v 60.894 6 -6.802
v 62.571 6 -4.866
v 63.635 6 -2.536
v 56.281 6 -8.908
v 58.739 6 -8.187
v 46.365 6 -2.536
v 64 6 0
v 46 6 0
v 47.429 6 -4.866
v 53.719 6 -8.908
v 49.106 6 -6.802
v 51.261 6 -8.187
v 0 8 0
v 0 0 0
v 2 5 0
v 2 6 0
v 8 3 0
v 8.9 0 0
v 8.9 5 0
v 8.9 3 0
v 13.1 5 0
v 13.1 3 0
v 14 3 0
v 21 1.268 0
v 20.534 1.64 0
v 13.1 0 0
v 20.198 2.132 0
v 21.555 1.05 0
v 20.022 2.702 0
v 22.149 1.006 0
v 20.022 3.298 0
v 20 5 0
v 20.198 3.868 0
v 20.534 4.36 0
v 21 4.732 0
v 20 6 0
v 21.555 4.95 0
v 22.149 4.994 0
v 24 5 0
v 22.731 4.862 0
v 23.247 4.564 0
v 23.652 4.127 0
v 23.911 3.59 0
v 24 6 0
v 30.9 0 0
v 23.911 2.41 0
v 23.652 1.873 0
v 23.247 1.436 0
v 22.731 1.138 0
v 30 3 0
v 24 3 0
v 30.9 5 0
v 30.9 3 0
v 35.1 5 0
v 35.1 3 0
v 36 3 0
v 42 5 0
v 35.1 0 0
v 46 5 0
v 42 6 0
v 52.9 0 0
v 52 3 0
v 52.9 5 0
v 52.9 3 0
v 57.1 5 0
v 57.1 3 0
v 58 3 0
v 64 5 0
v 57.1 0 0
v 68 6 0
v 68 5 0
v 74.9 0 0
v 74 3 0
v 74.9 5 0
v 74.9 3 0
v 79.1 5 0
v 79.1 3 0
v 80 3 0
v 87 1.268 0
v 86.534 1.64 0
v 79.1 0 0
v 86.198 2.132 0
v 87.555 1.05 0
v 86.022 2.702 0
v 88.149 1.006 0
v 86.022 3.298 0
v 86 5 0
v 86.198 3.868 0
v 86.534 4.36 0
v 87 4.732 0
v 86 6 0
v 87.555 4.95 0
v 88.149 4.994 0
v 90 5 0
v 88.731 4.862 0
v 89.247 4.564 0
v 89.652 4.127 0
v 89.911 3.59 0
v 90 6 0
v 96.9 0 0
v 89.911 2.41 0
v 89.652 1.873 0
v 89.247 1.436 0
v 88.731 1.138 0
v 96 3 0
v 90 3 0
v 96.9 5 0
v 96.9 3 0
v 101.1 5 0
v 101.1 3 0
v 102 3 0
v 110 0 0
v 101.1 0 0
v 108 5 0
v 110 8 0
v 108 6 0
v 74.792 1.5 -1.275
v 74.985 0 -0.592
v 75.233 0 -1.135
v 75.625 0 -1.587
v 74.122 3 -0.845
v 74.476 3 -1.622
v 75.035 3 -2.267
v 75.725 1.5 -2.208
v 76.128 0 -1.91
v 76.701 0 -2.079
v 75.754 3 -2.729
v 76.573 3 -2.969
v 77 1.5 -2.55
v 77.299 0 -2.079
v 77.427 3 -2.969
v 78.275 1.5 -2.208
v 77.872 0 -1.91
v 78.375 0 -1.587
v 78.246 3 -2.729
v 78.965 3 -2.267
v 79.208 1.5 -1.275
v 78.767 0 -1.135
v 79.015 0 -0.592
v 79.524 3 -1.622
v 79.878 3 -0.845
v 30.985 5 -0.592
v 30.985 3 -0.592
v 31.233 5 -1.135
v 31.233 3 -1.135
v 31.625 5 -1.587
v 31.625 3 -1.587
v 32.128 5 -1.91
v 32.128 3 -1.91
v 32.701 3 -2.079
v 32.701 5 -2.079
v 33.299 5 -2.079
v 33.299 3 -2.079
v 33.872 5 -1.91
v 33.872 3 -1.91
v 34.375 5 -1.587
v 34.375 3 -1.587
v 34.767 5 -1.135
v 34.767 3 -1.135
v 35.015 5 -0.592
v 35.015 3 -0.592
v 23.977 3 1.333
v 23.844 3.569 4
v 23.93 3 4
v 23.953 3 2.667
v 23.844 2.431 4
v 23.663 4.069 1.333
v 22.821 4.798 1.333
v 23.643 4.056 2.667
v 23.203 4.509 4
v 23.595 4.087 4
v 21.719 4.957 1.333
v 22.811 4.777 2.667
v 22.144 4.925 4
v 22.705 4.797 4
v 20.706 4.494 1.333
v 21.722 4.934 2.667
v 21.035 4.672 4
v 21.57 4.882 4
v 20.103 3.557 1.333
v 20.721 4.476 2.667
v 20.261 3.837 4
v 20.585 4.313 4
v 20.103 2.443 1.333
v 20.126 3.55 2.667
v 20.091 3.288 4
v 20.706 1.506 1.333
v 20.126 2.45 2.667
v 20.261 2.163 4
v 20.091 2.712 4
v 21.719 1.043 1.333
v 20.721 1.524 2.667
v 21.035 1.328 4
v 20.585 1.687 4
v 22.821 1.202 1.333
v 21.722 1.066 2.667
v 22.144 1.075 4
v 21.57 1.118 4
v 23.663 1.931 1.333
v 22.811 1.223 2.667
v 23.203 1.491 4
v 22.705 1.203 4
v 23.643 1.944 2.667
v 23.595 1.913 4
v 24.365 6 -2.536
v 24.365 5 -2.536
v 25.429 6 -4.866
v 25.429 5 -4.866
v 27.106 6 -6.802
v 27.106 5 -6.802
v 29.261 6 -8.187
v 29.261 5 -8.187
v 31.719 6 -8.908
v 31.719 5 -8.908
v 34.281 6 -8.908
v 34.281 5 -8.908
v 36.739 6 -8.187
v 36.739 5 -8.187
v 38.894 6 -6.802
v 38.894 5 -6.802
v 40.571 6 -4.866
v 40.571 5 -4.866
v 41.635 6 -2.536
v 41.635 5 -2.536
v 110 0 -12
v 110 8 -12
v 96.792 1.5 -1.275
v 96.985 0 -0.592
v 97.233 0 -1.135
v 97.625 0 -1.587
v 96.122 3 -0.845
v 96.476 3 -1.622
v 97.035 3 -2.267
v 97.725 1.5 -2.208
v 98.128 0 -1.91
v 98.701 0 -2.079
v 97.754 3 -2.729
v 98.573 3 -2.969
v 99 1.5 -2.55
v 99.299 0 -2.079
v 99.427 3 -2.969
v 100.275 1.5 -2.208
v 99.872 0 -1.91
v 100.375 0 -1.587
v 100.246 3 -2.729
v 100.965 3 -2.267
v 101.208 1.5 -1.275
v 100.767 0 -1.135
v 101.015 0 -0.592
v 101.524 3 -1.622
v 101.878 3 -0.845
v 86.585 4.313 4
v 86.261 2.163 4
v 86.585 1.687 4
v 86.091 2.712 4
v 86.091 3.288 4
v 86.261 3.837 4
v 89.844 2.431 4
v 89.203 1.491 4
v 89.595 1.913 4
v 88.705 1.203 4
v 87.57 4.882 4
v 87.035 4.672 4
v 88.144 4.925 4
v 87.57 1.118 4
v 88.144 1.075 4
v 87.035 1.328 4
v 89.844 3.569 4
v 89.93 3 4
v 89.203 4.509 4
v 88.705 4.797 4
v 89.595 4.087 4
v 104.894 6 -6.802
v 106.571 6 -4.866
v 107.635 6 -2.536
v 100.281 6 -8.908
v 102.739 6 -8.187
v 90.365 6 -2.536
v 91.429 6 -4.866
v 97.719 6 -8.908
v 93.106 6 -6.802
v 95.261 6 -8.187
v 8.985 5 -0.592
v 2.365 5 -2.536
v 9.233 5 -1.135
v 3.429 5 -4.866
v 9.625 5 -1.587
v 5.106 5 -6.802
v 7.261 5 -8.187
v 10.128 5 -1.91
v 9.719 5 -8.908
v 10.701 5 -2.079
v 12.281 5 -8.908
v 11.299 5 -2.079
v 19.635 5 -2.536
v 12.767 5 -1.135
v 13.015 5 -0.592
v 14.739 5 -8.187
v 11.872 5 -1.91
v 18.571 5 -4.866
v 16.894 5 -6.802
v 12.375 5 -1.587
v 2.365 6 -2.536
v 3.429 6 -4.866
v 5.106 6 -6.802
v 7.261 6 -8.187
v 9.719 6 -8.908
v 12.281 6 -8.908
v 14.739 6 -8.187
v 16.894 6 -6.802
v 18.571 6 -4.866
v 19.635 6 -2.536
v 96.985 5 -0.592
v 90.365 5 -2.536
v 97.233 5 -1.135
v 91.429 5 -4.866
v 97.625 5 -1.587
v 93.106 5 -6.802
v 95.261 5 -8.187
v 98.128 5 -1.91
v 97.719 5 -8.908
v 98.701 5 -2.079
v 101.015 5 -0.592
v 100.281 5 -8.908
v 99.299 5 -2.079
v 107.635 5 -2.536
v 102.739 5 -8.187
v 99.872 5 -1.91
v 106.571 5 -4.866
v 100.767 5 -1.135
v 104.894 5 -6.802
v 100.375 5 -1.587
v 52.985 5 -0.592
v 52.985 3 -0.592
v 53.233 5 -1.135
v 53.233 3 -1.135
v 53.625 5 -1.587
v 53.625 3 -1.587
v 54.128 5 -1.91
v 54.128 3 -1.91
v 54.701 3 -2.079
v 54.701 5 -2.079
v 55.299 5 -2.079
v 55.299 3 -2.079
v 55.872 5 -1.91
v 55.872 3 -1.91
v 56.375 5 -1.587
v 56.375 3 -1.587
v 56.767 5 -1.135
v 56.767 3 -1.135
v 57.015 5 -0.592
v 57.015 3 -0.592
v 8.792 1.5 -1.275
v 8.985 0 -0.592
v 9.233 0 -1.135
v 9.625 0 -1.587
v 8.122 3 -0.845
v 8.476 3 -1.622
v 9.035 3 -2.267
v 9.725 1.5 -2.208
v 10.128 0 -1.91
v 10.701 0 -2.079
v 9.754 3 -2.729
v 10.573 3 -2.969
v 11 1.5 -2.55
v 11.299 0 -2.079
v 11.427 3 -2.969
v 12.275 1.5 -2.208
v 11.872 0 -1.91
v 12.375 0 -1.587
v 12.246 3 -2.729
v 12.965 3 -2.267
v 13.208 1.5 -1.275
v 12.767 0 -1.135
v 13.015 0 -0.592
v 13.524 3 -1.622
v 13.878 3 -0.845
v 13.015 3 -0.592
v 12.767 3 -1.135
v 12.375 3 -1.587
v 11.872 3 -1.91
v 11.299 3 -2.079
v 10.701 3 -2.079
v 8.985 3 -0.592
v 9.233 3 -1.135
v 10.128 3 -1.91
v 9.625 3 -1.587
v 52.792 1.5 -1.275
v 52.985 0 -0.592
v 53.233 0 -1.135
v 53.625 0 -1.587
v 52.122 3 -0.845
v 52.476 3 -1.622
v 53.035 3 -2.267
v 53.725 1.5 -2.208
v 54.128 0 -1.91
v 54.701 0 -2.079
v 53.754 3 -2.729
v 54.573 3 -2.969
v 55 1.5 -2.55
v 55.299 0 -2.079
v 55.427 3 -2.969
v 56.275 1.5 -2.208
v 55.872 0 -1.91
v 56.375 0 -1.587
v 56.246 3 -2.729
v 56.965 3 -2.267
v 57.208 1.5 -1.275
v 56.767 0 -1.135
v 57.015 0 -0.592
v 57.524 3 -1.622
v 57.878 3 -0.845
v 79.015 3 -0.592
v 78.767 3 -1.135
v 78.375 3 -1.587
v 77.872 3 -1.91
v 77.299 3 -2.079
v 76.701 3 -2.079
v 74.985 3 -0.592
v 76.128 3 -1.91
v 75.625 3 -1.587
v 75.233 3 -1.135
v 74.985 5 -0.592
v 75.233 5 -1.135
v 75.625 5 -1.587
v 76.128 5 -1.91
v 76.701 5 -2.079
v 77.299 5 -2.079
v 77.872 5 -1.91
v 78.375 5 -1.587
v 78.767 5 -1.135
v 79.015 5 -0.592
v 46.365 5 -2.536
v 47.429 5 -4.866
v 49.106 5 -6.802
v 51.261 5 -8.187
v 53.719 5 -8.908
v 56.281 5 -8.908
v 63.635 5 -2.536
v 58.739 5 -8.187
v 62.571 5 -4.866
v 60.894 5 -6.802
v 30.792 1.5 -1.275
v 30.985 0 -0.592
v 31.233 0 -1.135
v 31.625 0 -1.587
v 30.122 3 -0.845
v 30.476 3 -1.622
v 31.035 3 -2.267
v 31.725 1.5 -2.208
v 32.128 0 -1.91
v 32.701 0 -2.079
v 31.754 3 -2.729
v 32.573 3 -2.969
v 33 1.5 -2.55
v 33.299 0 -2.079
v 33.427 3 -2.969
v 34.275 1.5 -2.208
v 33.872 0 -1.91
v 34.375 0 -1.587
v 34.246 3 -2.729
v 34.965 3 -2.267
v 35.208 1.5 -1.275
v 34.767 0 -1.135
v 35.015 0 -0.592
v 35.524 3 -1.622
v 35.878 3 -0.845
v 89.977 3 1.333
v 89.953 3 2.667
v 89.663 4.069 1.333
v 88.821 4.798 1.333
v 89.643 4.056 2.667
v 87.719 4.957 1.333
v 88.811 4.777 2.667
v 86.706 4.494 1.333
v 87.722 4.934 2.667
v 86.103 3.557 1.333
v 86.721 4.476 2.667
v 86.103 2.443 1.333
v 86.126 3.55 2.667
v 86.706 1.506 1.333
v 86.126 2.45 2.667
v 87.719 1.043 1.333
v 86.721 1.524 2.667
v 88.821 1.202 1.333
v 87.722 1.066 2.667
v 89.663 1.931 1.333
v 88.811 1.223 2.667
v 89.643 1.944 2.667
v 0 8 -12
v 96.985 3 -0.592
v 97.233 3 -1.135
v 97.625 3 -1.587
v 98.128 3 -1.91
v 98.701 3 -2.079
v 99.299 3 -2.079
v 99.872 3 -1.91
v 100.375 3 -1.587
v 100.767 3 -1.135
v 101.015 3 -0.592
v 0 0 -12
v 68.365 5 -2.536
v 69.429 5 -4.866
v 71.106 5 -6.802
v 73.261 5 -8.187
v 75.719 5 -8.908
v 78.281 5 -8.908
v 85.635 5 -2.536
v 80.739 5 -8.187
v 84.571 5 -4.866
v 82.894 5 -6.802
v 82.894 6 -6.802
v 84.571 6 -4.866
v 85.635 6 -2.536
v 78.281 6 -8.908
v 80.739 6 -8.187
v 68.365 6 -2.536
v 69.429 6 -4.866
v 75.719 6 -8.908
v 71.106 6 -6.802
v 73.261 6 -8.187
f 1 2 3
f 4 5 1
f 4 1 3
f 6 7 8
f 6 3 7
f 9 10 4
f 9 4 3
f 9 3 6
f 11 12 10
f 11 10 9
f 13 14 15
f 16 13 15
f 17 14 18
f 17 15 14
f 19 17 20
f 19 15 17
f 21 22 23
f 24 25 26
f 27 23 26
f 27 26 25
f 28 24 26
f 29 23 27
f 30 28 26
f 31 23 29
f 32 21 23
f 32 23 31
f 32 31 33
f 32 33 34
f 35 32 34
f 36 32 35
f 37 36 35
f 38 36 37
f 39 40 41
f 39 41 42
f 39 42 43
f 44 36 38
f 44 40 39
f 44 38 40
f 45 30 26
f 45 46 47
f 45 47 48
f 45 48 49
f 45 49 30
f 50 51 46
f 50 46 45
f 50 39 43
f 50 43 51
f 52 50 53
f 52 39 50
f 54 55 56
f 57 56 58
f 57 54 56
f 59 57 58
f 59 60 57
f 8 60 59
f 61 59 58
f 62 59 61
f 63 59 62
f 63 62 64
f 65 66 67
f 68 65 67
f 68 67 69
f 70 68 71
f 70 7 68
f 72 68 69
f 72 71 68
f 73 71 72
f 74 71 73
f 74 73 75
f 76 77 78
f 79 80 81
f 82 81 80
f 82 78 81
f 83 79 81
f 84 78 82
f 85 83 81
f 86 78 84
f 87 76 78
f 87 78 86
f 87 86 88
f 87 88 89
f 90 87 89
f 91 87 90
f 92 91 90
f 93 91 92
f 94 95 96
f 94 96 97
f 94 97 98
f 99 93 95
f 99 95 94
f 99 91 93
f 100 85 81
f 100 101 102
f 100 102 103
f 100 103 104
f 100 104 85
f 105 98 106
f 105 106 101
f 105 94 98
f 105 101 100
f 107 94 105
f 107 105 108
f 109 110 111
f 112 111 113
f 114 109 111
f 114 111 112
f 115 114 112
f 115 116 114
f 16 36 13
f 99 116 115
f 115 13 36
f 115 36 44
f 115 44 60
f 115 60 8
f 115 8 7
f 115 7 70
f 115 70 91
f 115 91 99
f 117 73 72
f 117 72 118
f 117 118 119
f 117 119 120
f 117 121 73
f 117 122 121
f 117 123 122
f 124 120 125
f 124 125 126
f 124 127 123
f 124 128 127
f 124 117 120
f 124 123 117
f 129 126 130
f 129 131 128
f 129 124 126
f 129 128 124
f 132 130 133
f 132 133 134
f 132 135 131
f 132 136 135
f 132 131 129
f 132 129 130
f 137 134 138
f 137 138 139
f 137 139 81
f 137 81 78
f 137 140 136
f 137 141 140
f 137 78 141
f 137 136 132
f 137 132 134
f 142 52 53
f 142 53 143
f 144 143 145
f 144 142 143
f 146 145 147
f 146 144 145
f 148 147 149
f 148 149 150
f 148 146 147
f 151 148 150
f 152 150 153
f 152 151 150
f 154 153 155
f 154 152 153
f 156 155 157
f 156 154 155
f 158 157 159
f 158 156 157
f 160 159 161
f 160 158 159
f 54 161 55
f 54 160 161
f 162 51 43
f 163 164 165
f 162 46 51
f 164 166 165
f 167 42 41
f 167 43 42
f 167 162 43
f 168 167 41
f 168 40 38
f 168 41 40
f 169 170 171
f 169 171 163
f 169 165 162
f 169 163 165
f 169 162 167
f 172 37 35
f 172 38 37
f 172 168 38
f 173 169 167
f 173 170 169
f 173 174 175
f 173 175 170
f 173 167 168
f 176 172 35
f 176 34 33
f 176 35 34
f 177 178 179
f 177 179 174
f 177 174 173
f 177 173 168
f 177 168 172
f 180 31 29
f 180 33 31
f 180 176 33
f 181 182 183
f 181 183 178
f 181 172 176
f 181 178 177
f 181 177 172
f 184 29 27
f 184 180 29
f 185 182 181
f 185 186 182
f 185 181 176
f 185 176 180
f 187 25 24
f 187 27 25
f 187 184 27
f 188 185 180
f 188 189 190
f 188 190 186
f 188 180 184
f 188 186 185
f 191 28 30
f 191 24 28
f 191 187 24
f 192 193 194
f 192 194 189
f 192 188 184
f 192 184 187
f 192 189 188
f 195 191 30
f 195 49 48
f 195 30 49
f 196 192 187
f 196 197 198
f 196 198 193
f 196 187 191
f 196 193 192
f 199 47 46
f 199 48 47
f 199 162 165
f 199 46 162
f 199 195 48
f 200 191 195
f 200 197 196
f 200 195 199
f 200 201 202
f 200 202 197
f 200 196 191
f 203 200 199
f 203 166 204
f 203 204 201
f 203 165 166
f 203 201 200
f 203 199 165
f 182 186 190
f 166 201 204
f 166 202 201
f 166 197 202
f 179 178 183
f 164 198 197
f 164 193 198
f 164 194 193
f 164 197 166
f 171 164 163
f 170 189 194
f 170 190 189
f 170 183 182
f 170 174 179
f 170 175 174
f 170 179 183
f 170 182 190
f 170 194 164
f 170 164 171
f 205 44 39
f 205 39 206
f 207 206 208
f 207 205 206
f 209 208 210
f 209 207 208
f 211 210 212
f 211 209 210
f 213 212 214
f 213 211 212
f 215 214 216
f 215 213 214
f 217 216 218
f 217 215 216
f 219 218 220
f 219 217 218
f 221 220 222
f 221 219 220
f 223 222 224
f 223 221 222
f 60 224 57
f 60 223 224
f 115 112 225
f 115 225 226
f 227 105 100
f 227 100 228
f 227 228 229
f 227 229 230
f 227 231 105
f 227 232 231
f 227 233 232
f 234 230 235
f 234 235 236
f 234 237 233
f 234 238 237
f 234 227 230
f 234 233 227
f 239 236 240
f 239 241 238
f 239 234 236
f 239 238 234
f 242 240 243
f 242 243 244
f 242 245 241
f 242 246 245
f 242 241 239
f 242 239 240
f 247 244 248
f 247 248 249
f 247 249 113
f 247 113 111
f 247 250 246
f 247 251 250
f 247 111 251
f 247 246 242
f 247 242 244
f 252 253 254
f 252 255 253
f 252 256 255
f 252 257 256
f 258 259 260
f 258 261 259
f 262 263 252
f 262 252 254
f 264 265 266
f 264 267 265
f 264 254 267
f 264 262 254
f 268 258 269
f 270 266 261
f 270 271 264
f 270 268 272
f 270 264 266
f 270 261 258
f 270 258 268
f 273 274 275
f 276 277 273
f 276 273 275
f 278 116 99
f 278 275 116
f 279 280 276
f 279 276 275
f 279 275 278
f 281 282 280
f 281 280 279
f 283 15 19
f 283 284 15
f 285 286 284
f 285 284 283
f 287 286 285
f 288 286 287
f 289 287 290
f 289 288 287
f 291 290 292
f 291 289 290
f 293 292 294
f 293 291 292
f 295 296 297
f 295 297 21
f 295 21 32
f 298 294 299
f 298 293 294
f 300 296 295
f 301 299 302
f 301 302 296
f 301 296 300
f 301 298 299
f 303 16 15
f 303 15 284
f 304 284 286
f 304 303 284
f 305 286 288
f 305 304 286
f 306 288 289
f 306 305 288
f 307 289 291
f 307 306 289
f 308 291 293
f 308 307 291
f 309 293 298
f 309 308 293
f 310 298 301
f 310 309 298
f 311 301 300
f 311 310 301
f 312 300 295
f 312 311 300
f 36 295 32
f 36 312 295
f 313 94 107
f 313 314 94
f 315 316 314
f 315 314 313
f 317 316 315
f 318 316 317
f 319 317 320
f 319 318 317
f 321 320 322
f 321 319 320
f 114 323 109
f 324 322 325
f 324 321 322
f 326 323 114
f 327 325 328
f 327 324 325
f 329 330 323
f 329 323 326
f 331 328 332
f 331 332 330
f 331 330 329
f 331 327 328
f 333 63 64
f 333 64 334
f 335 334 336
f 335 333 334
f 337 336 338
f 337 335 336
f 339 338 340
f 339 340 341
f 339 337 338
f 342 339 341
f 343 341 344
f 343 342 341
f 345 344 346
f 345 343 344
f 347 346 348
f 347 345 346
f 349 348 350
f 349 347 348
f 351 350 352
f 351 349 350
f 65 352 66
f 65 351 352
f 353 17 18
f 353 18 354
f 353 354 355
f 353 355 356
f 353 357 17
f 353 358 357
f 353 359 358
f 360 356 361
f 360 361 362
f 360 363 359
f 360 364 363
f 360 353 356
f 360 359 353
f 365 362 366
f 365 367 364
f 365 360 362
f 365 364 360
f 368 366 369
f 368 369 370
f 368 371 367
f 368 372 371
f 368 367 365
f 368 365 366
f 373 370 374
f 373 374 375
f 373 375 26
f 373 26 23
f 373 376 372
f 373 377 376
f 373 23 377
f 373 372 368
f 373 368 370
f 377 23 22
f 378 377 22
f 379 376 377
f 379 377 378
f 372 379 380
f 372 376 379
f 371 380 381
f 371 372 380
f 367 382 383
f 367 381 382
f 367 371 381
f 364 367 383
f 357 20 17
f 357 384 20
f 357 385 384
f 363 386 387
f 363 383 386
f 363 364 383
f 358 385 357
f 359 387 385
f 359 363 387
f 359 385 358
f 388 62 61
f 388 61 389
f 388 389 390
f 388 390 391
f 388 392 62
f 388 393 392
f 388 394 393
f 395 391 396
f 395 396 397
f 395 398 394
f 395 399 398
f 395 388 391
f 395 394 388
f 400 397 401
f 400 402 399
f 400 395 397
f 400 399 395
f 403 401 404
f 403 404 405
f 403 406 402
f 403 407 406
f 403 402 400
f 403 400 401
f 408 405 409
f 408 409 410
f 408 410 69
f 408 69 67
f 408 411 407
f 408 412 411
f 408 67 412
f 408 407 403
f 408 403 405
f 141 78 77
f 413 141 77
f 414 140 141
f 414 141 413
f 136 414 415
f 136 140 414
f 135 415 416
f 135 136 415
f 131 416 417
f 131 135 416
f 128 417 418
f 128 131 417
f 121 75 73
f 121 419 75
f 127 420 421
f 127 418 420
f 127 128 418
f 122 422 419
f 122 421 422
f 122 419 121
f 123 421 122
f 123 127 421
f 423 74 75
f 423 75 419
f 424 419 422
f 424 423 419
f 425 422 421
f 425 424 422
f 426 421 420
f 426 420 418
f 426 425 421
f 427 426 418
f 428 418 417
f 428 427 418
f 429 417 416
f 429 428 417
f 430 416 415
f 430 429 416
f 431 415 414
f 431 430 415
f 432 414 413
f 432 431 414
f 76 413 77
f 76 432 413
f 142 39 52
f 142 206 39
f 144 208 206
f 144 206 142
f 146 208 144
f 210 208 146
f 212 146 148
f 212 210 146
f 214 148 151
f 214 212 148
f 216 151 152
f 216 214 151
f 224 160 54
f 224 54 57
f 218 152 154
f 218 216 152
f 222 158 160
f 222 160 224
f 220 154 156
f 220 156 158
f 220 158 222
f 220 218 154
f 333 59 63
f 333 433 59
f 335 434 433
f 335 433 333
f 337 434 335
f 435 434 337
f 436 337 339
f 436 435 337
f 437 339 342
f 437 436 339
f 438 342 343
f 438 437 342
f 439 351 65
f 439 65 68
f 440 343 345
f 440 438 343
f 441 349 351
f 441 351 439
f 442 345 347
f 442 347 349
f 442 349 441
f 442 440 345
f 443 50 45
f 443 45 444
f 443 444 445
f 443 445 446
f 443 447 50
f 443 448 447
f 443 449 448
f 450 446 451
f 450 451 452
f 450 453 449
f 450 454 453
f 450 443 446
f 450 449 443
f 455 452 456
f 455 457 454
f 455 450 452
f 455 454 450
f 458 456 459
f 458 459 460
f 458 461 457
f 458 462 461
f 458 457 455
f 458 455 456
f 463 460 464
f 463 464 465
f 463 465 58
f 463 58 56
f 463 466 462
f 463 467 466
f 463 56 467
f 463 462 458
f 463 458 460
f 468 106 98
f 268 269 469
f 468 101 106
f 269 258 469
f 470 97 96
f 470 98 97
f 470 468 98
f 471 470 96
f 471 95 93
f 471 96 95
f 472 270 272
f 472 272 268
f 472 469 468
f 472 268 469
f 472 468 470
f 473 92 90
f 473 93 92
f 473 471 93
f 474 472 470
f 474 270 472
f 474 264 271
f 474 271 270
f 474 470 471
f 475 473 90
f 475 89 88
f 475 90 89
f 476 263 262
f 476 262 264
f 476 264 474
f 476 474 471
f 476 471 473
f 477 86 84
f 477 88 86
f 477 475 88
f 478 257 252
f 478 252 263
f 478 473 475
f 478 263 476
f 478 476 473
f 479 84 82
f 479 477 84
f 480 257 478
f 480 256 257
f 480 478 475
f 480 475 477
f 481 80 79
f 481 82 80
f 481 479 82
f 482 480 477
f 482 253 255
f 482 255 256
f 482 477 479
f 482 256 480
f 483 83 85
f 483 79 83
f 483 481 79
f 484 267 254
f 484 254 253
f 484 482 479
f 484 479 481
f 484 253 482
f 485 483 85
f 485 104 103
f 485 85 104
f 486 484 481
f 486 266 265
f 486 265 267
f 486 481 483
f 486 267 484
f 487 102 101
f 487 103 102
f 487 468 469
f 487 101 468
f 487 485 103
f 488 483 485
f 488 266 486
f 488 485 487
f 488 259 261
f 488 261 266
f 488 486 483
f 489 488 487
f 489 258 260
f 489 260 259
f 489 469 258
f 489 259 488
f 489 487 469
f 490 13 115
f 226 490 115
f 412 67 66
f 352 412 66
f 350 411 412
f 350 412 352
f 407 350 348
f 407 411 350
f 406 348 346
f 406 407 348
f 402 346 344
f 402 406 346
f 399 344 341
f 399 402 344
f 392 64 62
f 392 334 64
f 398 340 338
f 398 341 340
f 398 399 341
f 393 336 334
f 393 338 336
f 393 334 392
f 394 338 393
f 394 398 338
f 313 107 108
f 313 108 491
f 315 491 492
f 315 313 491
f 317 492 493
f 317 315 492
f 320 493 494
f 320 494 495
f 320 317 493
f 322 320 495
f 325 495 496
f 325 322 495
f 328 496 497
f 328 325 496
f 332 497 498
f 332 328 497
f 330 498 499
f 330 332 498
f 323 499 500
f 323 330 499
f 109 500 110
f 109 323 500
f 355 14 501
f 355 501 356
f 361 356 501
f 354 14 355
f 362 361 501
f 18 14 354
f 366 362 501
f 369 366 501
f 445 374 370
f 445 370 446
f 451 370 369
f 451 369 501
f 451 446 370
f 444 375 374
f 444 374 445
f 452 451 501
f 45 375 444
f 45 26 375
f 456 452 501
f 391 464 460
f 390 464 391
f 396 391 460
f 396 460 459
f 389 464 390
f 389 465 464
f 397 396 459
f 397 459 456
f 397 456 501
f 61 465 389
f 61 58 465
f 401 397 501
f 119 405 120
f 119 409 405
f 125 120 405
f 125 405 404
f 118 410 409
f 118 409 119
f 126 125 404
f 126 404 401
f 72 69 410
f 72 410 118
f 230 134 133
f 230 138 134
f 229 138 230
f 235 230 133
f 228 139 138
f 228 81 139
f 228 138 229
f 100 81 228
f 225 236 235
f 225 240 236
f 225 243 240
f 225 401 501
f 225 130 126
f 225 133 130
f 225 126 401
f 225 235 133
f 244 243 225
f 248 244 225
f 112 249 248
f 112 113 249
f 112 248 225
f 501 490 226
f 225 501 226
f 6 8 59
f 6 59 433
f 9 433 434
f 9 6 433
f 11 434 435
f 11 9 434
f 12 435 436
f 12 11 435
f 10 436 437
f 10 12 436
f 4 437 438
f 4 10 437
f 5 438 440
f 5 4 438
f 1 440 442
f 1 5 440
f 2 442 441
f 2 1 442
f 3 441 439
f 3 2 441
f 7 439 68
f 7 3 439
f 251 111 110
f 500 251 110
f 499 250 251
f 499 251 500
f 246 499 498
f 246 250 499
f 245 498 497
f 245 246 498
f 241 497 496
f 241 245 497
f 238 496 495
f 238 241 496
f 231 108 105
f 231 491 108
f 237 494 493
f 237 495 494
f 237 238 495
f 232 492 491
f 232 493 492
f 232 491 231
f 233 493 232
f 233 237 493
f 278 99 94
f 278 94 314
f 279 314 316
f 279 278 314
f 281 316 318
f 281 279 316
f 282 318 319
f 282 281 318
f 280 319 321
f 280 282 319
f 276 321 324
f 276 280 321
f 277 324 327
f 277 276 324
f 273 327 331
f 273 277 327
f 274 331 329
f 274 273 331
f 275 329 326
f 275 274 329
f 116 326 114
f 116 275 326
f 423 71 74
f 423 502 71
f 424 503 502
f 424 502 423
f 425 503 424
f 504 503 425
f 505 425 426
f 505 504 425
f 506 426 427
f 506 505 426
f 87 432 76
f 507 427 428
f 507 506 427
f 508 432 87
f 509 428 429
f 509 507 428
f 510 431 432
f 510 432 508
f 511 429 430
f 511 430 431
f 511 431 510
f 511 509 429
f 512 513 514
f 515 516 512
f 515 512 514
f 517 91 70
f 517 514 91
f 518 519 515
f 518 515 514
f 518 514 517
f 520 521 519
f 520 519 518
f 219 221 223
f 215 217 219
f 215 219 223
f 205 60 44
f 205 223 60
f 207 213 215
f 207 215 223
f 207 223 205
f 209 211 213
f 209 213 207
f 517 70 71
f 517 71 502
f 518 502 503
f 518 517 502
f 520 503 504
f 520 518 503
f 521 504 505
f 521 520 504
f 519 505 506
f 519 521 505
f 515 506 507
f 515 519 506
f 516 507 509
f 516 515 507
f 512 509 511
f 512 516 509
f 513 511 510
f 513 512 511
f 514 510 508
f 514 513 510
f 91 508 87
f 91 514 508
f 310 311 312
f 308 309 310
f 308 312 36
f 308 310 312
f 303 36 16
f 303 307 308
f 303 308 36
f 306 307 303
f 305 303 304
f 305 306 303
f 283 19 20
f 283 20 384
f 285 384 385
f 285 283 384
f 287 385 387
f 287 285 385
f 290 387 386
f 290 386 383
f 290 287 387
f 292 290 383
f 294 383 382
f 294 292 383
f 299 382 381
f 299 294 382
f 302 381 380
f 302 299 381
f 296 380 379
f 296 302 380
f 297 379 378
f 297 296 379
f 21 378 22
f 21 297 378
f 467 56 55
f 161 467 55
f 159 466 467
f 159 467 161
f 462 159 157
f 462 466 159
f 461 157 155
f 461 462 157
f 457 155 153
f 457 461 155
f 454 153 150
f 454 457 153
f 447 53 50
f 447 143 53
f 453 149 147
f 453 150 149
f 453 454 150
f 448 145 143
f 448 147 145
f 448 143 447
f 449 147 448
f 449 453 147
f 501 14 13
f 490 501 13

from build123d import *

# Parameters (mm, degrees)
SKETCH2_W           = 110
SKETCH2_H           = 8
BOSS_EXTRUDE1_DEPTH = 12
LPATTERN1_COUNT     = 5
LPATTERN1_PITCH     = 22
SKETCH4_R           = 2
BOSS_EXTRUDE2_DEPTH = 4
BOSS_EXTRUDE2_TAPER = 1


with BuildPart() as part:
    # Sketch2 → Boss-Extrude1 (new body)
    with BuildSketch(Plane.XY):
        with Locations((55, 4)):
            Rectangle(SKETCH2_W, SKETCH2_H)
    extrude(amount=-BOSS_EXTRUDE1_DEPTH)

    # Sketch3 → Cut-Revolve1 (revolve, cut)
    with BuildSketch(Plane.XY):
        Polygon((8, 3), (8.9, 3), (8.9, 5), (2, 5), (2, 6), (11, 6), (11, 0), (8.9, 0), align=None)
    cut_revolve1 = revolve(axis=Axis((11, 6, 0), (0, -1, 0)), mode=Mode.SUBTRACT)

    # LPattern1: Cut-Revolve1 ×5
    with Locations(*[(i * LPATTERN1_PITCH, 0, 0) for i in range(1, LPATTERN1_COUNT)]):
        add(cut_revolve1, mode=Mode.SUBTRACT)

    # Sketch4 → Boss-Extrude2 (add)
    with BuildSketch(Plane.XY):
        with Locations((22, 3)):
            Circle(SKETCH4_R)
        with Locations((88, 3)):
            Circle(SKETCH4_R)
    extrude(amount=BOSS_EXTRUDE2_DEPTH, taper=BOSS_EXTRUDE2_TAPER)


solid = part.part
